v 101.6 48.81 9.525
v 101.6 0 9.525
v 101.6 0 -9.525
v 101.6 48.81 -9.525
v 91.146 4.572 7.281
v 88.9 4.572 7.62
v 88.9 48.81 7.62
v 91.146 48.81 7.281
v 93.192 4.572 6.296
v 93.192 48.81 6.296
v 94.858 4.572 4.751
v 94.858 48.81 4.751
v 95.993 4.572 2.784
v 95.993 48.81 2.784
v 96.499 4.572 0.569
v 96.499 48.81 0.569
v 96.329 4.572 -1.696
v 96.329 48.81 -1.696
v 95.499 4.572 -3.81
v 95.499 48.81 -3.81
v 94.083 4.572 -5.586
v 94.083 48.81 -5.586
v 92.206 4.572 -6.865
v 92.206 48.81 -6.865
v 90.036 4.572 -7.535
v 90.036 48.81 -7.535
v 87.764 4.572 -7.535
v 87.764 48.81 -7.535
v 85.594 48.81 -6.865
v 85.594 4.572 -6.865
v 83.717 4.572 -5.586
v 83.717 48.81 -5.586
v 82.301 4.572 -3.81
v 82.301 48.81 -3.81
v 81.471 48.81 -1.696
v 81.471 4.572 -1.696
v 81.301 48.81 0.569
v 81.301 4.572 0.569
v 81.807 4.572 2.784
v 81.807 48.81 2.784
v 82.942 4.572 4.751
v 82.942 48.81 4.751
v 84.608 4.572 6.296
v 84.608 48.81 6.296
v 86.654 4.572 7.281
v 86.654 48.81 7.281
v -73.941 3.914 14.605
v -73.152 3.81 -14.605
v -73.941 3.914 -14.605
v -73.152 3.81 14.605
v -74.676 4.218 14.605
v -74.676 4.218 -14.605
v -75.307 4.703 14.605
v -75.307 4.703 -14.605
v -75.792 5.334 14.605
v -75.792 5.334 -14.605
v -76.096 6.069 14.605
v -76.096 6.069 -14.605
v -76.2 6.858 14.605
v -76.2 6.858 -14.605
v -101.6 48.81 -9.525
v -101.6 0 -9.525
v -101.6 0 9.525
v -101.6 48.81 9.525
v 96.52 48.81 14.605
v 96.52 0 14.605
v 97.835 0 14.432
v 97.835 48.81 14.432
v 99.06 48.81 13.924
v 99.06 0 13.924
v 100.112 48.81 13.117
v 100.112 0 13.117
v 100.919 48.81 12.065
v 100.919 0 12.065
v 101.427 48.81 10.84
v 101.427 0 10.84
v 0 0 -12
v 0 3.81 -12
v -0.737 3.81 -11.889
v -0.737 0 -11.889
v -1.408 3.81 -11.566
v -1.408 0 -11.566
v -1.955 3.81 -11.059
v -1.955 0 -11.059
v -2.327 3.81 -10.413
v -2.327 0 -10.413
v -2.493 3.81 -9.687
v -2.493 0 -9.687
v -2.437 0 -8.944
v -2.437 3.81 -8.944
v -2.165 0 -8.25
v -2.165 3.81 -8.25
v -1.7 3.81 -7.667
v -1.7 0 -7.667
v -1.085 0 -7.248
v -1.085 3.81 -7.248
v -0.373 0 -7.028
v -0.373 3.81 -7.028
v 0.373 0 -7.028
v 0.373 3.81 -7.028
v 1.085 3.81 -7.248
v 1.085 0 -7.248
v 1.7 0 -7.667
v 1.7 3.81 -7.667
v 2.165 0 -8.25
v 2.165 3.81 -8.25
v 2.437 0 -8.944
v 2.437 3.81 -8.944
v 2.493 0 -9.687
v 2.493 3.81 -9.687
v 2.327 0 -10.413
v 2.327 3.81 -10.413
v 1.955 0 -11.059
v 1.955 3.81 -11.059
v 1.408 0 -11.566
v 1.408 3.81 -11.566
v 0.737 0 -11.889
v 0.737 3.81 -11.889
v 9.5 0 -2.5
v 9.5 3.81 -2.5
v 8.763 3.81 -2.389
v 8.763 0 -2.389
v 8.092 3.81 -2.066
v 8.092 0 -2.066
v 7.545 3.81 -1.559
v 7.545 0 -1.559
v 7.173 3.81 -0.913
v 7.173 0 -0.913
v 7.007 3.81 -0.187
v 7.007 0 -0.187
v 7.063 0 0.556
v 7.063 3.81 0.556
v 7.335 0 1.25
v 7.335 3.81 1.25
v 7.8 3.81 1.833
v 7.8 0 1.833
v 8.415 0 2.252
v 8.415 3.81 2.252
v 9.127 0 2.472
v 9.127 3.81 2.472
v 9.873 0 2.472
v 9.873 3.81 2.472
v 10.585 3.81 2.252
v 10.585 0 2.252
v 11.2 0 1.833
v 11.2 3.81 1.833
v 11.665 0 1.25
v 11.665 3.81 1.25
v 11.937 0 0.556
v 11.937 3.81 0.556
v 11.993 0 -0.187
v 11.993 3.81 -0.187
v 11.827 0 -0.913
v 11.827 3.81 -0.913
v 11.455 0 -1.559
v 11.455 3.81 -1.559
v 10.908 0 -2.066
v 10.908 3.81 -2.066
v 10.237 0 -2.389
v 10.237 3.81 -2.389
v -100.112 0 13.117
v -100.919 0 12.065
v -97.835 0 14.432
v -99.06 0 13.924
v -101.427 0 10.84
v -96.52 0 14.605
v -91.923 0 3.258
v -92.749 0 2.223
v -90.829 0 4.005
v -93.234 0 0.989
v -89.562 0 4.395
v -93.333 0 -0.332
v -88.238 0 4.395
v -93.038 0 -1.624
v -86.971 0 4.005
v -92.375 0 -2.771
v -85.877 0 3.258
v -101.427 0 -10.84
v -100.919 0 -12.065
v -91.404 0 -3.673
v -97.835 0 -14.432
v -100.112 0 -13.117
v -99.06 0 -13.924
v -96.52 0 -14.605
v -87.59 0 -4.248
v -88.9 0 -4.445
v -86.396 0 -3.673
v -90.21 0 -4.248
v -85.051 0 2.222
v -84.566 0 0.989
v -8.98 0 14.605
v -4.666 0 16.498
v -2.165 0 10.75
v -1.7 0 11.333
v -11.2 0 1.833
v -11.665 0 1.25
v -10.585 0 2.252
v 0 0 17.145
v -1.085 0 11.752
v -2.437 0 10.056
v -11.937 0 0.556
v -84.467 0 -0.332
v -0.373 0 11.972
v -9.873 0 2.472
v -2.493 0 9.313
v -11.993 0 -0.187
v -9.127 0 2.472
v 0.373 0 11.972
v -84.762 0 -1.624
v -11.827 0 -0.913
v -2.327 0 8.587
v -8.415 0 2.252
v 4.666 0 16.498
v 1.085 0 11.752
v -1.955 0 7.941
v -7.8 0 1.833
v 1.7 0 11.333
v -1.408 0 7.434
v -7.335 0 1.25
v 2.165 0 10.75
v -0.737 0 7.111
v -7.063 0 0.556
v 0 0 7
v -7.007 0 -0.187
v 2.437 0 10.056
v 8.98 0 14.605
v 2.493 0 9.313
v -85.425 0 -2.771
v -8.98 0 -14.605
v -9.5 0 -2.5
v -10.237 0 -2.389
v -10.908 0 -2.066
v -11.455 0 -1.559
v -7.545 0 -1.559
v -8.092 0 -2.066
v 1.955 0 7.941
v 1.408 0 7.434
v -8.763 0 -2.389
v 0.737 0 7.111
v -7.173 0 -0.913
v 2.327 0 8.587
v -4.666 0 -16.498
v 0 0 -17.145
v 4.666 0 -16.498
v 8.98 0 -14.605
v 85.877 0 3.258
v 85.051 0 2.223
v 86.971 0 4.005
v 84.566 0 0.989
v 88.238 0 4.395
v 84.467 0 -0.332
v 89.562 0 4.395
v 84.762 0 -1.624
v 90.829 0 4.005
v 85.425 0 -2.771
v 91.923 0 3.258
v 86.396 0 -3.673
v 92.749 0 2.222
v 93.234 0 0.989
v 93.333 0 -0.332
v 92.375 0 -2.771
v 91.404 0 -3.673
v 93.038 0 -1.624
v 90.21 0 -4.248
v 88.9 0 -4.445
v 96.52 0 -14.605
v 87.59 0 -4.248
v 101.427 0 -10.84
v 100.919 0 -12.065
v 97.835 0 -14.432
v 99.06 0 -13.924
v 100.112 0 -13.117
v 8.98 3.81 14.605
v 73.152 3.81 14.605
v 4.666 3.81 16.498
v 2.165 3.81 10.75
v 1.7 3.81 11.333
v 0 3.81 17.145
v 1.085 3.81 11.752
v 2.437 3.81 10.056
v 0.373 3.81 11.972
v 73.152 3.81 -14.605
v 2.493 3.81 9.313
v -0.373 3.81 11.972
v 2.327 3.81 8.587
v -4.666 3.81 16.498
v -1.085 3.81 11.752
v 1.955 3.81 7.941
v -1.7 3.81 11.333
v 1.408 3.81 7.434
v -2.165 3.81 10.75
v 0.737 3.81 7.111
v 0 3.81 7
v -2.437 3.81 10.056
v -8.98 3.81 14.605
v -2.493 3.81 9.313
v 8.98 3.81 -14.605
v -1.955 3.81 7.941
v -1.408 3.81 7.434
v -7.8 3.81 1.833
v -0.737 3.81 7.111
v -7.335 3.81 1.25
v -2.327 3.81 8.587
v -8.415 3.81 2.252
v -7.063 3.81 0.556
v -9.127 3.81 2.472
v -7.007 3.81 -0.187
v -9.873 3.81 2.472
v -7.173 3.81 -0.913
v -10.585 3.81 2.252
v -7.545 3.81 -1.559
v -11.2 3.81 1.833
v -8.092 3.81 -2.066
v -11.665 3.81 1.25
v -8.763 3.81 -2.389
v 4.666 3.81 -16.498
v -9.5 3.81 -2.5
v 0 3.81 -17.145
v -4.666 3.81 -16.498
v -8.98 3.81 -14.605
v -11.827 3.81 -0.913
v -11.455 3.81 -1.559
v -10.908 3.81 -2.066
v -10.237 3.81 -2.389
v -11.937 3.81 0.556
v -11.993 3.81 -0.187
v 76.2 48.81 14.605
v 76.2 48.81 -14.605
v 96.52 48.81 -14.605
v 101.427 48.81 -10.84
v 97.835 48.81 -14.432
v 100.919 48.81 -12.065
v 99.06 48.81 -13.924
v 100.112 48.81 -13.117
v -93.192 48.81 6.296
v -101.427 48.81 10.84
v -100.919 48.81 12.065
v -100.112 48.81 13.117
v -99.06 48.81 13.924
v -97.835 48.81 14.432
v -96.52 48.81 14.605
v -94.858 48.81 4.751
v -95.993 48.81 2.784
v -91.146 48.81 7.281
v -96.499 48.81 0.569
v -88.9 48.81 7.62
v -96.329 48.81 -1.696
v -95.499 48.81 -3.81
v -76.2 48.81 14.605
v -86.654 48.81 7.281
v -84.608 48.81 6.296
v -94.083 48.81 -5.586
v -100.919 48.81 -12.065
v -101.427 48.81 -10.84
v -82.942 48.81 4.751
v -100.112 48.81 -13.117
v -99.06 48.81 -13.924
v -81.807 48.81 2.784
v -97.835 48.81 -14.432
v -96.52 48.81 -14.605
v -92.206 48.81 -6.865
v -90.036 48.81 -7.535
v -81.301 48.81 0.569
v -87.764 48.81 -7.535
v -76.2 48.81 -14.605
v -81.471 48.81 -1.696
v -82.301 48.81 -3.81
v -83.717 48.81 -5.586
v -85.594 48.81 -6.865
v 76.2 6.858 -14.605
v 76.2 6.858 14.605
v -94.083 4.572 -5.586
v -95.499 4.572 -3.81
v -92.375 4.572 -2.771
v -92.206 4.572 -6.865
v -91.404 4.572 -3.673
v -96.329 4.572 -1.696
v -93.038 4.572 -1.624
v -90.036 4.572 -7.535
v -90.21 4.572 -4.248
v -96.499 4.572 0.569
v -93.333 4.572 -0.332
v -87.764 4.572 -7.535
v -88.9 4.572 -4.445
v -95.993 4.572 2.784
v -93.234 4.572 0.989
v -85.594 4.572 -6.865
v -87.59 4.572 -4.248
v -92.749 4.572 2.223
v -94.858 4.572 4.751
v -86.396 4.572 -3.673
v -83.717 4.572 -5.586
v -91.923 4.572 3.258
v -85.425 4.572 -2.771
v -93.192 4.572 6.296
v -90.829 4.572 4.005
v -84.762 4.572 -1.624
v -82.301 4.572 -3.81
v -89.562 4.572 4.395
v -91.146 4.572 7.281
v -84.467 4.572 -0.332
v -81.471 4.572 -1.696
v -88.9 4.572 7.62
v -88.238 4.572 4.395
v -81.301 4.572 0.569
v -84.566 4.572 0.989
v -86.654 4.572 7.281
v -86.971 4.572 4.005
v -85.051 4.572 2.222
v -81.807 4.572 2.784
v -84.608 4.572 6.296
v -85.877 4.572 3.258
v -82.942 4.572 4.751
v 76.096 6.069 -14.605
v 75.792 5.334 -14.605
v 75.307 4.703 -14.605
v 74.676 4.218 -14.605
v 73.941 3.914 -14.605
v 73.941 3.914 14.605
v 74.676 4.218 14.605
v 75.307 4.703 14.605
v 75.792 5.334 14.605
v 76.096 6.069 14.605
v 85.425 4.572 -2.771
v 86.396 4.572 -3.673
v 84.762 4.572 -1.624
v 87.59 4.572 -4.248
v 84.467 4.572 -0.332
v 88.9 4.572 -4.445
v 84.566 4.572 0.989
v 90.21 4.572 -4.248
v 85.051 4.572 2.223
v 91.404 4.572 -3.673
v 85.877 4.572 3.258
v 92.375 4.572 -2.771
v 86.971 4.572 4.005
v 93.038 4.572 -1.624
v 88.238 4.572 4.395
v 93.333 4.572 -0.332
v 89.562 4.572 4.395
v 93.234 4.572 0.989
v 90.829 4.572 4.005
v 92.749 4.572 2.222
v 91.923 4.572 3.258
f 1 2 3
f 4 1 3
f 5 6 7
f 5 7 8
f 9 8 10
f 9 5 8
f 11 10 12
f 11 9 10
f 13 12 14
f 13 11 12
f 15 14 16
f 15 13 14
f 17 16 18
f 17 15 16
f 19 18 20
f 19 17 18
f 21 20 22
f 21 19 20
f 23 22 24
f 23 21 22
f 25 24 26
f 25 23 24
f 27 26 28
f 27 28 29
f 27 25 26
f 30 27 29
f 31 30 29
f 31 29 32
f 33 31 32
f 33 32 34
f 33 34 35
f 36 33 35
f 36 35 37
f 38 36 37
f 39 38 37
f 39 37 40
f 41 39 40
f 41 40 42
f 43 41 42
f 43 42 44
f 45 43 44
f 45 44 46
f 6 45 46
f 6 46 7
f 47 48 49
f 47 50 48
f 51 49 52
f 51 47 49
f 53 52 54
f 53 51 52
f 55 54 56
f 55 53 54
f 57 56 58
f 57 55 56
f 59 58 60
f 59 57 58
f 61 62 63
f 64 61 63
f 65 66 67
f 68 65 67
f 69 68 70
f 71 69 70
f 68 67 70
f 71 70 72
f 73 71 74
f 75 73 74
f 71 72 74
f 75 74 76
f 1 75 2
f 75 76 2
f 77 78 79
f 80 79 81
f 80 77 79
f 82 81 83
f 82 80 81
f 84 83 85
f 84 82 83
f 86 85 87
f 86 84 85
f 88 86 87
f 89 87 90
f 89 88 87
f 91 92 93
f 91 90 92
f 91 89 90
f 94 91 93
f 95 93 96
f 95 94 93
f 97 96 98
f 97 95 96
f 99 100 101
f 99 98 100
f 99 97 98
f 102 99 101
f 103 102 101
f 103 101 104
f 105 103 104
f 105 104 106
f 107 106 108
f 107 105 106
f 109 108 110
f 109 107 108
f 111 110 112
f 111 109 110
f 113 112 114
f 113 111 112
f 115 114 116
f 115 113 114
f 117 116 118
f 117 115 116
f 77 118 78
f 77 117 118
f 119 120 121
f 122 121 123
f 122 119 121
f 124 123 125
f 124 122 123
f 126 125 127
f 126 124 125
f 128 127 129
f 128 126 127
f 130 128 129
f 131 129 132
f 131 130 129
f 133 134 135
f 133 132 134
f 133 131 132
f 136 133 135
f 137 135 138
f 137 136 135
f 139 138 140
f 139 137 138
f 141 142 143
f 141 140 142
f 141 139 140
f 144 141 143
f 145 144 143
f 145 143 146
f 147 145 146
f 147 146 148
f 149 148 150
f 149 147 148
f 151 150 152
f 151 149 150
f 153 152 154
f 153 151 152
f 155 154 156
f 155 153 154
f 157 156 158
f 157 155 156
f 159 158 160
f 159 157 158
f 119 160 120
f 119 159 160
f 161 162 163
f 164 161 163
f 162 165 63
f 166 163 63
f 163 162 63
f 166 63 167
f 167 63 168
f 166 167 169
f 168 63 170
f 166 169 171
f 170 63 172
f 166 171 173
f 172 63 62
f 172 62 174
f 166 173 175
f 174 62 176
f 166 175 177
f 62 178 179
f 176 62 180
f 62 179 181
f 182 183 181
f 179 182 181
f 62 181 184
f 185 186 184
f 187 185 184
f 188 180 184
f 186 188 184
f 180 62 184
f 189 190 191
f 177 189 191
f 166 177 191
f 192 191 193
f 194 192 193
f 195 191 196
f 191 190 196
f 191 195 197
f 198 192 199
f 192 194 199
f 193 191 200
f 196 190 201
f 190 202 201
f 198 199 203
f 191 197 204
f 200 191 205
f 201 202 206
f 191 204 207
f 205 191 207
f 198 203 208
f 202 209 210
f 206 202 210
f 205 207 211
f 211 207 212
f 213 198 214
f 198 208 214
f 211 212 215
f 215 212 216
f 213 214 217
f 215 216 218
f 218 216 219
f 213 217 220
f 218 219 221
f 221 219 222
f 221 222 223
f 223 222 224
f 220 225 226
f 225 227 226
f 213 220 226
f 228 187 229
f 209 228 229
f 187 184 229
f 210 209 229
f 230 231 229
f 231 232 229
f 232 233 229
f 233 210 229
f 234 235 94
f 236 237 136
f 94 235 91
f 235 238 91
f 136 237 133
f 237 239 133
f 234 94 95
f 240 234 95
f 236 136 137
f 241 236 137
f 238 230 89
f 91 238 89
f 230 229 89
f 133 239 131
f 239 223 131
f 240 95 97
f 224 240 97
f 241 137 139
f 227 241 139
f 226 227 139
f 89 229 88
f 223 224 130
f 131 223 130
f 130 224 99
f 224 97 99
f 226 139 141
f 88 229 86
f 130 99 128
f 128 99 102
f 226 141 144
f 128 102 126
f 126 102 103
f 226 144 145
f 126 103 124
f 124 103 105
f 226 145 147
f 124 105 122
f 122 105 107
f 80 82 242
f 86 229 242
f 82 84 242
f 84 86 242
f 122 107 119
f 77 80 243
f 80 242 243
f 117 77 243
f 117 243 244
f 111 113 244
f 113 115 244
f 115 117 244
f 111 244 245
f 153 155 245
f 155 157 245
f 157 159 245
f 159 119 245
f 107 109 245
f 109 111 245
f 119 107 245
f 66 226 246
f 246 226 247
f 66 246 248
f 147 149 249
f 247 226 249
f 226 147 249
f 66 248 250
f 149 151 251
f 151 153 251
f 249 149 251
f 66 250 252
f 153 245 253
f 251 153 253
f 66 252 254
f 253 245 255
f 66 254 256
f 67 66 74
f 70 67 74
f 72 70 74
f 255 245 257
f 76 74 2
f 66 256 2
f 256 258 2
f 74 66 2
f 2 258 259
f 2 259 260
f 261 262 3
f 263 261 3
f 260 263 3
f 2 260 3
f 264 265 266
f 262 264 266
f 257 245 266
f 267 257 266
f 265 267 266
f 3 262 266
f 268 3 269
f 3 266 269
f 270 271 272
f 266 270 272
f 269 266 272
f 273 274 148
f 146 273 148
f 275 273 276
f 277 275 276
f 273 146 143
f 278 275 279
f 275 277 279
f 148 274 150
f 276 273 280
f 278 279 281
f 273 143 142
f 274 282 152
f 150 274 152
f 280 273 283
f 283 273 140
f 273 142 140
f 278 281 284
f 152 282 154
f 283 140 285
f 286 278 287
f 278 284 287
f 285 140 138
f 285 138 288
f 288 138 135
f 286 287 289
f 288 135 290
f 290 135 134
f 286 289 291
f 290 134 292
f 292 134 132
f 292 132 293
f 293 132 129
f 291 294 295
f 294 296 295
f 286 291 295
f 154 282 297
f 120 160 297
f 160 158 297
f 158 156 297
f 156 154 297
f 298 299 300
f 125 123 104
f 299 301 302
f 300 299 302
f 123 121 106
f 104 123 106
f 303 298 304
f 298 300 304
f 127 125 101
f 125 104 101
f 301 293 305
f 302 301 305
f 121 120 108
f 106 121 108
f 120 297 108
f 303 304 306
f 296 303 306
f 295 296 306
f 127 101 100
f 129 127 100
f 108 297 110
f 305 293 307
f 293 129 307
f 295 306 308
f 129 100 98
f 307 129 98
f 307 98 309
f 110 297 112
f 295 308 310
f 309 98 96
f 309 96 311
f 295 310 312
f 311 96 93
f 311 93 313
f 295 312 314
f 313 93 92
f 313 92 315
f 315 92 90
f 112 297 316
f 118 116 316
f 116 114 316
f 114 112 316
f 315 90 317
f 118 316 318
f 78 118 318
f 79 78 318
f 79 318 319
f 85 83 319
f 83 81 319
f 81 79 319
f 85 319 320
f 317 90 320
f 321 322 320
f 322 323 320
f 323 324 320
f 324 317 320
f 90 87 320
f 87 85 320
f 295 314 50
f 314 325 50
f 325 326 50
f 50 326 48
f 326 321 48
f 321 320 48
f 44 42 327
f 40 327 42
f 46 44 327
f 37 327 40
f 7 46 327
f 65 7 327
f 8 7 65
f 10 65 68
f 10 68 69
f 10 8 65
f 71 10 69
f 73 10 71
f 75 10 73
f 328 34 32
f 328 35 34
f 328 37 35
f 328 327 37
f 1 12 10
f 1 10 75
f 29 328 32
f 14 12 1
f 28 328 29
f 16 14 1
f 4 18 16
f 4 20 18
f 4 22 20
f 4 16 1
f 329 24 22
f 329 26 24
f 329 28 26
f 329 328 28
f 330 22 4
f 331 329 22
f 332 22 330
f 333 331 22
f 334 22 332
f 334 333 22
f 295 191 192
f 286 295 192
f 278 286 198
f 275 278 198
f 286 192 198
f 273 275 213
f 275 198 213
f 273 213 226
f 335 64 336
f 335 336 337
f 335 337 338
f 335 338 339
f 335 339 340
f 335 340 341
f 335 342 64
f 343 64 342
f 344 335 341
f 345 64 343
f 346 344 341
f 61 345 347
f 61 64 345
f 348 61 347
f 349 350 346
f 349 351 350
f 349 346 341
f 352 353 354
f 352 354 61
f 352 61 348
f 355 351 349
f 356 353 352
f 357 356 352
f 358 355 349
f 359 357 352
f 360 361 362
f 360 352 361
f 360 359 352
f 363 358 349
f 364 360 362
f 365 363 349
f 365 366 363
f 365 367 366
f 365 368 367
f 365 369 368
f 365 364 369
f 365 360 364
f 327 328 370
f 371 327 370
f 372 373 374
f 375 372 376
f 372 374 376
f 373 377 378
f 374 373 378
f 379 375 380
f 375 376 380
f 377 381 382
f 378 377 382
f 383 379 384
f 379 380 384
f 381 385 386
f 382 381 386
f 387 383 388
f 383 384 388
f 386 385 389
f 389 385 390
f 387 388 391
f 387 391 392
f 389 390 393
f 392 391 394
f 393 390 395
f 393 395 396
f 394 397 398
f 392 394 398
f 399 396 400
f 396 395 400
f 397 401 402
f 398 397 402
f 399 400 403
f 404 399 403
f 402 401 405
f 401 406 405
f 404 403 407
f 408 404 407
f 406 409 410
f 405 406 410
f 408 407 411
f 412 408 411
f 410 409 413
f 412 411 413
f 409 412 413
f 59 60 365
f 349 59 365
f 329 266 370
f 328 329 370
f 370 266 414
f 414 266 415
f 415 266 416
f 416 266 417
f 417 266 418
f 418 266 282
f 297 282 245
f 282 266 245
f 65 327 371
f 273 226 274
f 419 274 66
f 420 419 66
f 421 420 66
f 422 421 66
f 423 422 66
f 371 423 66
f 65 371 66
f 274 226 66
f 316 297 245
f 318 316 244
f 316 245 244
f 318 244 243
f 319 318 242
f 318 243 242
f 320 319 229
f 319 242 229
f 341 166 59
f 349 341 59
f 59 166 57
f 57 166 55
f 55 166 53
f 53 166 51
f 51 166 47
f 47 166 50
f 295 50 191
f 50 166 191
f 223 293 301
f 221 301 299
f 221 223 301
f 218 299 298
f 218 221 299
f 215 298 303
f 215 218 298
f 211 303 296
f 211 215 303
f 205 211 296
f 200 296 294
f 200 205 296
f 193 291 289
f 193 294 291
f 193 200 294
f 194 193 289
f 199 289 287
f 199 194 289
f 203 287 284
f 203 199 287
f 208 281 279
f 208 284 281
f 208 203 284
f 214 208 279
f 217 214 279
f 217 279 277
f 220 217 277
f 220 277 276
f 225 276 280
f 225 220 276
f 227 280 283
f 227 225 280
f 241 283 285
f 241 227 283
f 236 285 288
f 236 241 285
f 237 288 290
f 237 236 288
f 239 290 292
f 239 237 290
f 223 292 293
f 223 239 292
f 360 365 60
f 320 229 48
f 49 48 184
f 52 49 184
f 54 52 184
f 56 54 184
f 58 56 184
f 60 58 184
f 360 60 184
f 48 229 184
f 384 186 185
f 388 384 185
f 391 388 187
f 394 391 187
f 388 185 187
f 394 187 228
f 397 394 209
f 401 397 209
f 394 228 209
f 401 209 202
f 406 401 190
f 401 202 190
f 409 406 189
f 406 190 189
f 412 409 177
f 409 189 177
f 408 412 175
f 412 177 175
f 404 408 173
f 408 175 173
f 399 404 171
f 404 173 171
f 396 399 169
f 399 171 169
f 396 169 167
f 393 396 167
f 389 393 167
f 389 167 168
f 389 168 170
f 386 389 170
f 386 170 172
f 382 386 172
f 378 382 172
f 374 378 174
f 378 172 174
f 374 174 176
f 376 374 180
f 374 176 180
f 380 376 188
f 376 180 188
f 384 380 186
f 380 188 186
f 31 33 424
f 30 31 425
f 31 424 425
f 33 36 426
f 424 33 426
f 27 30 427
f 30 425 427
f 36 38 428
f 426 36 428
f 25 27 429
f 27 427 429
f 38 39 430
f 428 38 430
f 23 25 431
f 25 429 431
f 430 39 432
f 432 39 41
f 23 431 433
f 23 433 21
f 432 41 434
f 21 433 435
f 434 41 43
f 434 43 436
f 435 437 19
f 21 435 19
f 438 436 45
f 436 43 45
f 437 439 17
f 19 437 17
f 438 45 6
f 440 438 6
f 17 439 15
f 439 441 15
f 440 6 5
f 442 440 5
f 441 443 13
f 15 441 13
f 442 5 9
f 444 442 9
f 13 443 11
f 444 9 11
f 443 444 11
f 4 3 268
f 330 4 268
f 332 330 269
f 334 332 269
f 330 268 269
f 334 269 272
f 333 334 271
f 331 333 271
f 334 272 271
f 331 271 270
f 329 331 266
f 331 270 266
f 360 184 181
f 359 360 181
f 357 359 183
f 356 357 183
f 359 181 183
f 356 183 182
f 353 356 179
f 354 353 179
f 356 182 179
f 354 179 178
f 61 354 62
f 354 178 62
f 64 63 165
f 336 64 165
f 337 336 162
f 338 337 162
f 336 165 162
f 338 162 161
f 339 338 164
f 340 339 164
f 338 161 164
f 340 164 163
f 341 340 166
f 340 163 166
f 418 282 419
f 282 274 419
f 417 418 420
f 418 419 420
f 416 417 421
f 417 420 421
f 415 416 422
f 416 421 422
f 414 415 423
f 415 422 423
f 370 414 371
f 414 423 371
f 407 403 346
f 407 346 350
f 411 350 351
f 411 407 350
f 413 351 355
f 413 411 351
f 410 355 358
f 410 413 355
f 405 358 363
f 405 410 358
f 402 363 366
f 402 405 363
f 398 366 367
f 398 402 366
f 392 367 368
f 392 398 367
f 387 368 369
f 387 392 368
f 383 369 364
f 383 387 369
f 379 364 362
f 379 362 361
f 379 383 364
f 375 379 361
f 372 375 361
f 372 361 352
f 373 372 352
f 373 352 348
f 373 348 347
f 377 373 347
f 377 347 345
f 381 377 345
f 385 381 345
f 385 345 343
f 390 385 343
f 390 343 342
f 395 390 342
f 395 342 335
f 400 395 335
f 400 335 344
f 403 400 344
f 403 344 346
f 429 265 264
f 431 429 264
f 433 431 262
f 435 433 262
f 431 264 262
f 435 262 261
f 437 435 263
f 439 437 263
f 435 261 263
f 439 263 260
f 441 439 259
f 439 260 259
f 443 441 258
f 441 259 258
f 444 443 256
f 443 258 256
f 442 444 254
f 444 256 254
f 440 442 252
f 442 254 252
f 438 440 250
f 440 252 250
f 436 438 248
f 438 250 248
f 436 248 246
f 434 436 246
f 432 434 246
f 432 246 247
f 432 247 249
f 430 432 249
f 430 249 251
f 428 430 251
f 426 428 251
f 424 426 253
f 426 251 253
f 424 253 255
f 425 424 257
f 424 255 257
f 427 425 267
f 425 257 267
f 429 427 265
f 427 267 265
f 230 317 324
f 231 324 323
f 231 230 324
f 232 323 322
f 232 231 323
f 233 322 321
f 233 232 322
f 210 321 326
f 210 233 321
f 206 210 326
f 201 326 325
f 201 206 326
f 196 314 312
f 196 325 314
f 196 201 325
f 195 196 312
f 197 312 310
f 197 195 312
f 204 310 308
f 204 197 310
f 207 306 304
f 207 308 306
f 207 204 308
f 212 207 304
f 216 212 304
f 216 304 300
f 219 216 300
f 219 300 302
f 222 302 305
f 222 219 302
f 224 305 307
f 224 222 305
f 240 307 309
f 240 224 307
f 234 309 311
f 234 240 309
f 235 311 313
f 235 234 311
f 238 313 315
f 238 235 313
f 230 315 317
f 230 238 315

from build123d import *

# Parameters (mm, degrees)
SKETCH1_R                = 17.145
SKETCH1_R_2              = 2.5
BOSS_EXTRUDE1_DEPTH      = 3.81
BOSS_EXTRUDE2_DEPTH      = 45
BOSS_EXTRUDE2_DEPTH_BACK = 3.81
SKETCH2_R                = 7.62
SKETCH2_R_2              = 2.5
CUT_EXTRUDE2_DEPTH       = 118.102684
SKETCH6_R                = 8.89
SKETCH6_R_2              = 4.445
BOSS_EXTRUDE3_DEPTH      = 4.572
FILLET2_R                = 3.048


with BuildPart() as part:
    # Sketch1 → Boss-Extrude1 (new body)
    with BuildSketch(Plane(origin=(0, 0, 0), x_dir=(1, 0, 0), z_dir=(0, 1, 0))):
        with Locations(Location((0, 0, 0), (0, 0, 90))):
            Circle(SKETCH1_R)
        with Locations(Location((0, 9.5, 0), (0, 0, 90))):
            Circle(SKETCH1_R_2, mode=Mode.SUBTRACT)
        with Locations(Location((9.5, 0, 0), (0, 0, 90))):
            Circle(SKETCH1_R_2, mode=Mode.SUBTRACT)
        with Locations(Location((0, -9.5, 0), (0, 0, 90))):
            Circle(SKETCH1_R_2, mode=Mode.SUBTRACT)
        with Locations(Location((-9.5, 0, 0), (0, 0, 90))):
            Circle(SKETCH1_R_2, mode=Mode.SUBTRACT)
    extrude(amount=BOSS_EXTRUDE1_DEPTH)

    # Sketch2 → Boss-Extrude2 (add, two sides: drawn at the far end of the back side and taken through both)
    with BuildSketch(Plane(origin=(0, 3.81, 0), x_dir=(1, 0, 0), z_dir=(0, 1, 0)).offset(-BOSS_EXTRUDE2_DEPTH_BACK)):
        with BuildLine():
            Line((-96.52, -14.605), (96.52, -14.605))
            ThreePointArc((96.52, -14.605), (100.112102448, -13.117102448), (101.6, -9.525))
            Line((101.6, -9.525), (101.6, 9.525))
            ThreePointArc((101.6, 9.525), (100.112102448, 13.117102448), (96.52, 14.605))
            Line((96.52, 14.605), (-96.52, 14.605))
            ThreePointArc((-96.52, 14.605), (-100.112102448, 13.117102448), (-101.6, 9.525))
            Line((-101.6, 9.525), (-101.6, -9.525))
            ThreePointArc((-101.6, -9.525), (-100.112102448, -13.117102448), (-96.52, -14.605))
        make_face()
        with Locations(Location((-88.9, 0, 0), (0, 0, 270))):
            Circle(SKETCH2_R, mode=Mode.SUBTRACT)
        with Locations(Location((88.9, 0, 0), (0, 0, 270))):
            Circle(SKETCH2_R, mode=Mode.SUBTRACT)
        with Locations(Location((9.5, 0, 0), (0, 0, 90))):
            Circle(SKETCH2_R_2, mode=Mode.SUBTRACT)
        with Locations(Location((0, 9.5, 0), (0, 0, 90))):
            Circle(SKETCH2_R_2, mode=Mode.SUBTRACT)
        with Locations(Location((-9.5, 0, 0), (0, 0, 90))):
            Circle(SKETCH2_R_2, mode=Mode.SUBTRACT)
        with Locations(Location((0, -9.5, 0), (0, 0, 90))):
            Circle(SKETCH2_R_2, mode=Mode.SUBTRACT)
    extrude(amount=BOSS_EXTRUDE2_DEPTH + BOSS_EXTRUDE2_DEPTH_BACK)

    # Sketch5 → Cut-Extrude2 (cut, through all)
    with BuildSketch(Plane(origin=(0, 0, -14.605), x_dir=(-1, 0, 0), z_dir=(0, 0, -1))):
        Polygon((-76.2, 3.81), (0, 3.81), (76.2, 3.81), (76.2, 48.81), (-76.2, 48.81), align=None)
    extrude(amount=-CUT_EXTRUDE2_DEPTH, mode=Mode.SUBTRACT)

    # Sketch6 → Boss-Extrude3 (add)
    # profile 1 of 2: a face of its own
    with BuildSketch(Plane.XZ):
        with Locations((-88.9, 0)):
            Circle(SKETCH6_R)
        with Locations(Location((-88.9, 0, 0), (0, 0, 270))):
            Circle(SKETCH6_R_2, mode=Mode.SUBTRACT)
    # profile 2 of 2: a face of its own
    with BuildSketch(Plane.XZ):
        with Locations((88.9, 0)):
            Circle(SKETCH6_R)
        with Locations(Location((88.9, 0, 0), (0, 0, 270))):
            Circle(SKETCH6_R_2, mode=Mode.SUBTRACT)
    extrude(amount=-BOSS_EXTRUDE3_DEPTH)

    # Fillet2
    fillet2_edges = [part.edges().sort_by_distance(p)[0] for p in [
        (-76.2, 3.81, 0),
        (76.2, 3.81, 0),
    ]]
    fillet(fillet2_edges, radius=FILLET2_R)


solid = part.part
